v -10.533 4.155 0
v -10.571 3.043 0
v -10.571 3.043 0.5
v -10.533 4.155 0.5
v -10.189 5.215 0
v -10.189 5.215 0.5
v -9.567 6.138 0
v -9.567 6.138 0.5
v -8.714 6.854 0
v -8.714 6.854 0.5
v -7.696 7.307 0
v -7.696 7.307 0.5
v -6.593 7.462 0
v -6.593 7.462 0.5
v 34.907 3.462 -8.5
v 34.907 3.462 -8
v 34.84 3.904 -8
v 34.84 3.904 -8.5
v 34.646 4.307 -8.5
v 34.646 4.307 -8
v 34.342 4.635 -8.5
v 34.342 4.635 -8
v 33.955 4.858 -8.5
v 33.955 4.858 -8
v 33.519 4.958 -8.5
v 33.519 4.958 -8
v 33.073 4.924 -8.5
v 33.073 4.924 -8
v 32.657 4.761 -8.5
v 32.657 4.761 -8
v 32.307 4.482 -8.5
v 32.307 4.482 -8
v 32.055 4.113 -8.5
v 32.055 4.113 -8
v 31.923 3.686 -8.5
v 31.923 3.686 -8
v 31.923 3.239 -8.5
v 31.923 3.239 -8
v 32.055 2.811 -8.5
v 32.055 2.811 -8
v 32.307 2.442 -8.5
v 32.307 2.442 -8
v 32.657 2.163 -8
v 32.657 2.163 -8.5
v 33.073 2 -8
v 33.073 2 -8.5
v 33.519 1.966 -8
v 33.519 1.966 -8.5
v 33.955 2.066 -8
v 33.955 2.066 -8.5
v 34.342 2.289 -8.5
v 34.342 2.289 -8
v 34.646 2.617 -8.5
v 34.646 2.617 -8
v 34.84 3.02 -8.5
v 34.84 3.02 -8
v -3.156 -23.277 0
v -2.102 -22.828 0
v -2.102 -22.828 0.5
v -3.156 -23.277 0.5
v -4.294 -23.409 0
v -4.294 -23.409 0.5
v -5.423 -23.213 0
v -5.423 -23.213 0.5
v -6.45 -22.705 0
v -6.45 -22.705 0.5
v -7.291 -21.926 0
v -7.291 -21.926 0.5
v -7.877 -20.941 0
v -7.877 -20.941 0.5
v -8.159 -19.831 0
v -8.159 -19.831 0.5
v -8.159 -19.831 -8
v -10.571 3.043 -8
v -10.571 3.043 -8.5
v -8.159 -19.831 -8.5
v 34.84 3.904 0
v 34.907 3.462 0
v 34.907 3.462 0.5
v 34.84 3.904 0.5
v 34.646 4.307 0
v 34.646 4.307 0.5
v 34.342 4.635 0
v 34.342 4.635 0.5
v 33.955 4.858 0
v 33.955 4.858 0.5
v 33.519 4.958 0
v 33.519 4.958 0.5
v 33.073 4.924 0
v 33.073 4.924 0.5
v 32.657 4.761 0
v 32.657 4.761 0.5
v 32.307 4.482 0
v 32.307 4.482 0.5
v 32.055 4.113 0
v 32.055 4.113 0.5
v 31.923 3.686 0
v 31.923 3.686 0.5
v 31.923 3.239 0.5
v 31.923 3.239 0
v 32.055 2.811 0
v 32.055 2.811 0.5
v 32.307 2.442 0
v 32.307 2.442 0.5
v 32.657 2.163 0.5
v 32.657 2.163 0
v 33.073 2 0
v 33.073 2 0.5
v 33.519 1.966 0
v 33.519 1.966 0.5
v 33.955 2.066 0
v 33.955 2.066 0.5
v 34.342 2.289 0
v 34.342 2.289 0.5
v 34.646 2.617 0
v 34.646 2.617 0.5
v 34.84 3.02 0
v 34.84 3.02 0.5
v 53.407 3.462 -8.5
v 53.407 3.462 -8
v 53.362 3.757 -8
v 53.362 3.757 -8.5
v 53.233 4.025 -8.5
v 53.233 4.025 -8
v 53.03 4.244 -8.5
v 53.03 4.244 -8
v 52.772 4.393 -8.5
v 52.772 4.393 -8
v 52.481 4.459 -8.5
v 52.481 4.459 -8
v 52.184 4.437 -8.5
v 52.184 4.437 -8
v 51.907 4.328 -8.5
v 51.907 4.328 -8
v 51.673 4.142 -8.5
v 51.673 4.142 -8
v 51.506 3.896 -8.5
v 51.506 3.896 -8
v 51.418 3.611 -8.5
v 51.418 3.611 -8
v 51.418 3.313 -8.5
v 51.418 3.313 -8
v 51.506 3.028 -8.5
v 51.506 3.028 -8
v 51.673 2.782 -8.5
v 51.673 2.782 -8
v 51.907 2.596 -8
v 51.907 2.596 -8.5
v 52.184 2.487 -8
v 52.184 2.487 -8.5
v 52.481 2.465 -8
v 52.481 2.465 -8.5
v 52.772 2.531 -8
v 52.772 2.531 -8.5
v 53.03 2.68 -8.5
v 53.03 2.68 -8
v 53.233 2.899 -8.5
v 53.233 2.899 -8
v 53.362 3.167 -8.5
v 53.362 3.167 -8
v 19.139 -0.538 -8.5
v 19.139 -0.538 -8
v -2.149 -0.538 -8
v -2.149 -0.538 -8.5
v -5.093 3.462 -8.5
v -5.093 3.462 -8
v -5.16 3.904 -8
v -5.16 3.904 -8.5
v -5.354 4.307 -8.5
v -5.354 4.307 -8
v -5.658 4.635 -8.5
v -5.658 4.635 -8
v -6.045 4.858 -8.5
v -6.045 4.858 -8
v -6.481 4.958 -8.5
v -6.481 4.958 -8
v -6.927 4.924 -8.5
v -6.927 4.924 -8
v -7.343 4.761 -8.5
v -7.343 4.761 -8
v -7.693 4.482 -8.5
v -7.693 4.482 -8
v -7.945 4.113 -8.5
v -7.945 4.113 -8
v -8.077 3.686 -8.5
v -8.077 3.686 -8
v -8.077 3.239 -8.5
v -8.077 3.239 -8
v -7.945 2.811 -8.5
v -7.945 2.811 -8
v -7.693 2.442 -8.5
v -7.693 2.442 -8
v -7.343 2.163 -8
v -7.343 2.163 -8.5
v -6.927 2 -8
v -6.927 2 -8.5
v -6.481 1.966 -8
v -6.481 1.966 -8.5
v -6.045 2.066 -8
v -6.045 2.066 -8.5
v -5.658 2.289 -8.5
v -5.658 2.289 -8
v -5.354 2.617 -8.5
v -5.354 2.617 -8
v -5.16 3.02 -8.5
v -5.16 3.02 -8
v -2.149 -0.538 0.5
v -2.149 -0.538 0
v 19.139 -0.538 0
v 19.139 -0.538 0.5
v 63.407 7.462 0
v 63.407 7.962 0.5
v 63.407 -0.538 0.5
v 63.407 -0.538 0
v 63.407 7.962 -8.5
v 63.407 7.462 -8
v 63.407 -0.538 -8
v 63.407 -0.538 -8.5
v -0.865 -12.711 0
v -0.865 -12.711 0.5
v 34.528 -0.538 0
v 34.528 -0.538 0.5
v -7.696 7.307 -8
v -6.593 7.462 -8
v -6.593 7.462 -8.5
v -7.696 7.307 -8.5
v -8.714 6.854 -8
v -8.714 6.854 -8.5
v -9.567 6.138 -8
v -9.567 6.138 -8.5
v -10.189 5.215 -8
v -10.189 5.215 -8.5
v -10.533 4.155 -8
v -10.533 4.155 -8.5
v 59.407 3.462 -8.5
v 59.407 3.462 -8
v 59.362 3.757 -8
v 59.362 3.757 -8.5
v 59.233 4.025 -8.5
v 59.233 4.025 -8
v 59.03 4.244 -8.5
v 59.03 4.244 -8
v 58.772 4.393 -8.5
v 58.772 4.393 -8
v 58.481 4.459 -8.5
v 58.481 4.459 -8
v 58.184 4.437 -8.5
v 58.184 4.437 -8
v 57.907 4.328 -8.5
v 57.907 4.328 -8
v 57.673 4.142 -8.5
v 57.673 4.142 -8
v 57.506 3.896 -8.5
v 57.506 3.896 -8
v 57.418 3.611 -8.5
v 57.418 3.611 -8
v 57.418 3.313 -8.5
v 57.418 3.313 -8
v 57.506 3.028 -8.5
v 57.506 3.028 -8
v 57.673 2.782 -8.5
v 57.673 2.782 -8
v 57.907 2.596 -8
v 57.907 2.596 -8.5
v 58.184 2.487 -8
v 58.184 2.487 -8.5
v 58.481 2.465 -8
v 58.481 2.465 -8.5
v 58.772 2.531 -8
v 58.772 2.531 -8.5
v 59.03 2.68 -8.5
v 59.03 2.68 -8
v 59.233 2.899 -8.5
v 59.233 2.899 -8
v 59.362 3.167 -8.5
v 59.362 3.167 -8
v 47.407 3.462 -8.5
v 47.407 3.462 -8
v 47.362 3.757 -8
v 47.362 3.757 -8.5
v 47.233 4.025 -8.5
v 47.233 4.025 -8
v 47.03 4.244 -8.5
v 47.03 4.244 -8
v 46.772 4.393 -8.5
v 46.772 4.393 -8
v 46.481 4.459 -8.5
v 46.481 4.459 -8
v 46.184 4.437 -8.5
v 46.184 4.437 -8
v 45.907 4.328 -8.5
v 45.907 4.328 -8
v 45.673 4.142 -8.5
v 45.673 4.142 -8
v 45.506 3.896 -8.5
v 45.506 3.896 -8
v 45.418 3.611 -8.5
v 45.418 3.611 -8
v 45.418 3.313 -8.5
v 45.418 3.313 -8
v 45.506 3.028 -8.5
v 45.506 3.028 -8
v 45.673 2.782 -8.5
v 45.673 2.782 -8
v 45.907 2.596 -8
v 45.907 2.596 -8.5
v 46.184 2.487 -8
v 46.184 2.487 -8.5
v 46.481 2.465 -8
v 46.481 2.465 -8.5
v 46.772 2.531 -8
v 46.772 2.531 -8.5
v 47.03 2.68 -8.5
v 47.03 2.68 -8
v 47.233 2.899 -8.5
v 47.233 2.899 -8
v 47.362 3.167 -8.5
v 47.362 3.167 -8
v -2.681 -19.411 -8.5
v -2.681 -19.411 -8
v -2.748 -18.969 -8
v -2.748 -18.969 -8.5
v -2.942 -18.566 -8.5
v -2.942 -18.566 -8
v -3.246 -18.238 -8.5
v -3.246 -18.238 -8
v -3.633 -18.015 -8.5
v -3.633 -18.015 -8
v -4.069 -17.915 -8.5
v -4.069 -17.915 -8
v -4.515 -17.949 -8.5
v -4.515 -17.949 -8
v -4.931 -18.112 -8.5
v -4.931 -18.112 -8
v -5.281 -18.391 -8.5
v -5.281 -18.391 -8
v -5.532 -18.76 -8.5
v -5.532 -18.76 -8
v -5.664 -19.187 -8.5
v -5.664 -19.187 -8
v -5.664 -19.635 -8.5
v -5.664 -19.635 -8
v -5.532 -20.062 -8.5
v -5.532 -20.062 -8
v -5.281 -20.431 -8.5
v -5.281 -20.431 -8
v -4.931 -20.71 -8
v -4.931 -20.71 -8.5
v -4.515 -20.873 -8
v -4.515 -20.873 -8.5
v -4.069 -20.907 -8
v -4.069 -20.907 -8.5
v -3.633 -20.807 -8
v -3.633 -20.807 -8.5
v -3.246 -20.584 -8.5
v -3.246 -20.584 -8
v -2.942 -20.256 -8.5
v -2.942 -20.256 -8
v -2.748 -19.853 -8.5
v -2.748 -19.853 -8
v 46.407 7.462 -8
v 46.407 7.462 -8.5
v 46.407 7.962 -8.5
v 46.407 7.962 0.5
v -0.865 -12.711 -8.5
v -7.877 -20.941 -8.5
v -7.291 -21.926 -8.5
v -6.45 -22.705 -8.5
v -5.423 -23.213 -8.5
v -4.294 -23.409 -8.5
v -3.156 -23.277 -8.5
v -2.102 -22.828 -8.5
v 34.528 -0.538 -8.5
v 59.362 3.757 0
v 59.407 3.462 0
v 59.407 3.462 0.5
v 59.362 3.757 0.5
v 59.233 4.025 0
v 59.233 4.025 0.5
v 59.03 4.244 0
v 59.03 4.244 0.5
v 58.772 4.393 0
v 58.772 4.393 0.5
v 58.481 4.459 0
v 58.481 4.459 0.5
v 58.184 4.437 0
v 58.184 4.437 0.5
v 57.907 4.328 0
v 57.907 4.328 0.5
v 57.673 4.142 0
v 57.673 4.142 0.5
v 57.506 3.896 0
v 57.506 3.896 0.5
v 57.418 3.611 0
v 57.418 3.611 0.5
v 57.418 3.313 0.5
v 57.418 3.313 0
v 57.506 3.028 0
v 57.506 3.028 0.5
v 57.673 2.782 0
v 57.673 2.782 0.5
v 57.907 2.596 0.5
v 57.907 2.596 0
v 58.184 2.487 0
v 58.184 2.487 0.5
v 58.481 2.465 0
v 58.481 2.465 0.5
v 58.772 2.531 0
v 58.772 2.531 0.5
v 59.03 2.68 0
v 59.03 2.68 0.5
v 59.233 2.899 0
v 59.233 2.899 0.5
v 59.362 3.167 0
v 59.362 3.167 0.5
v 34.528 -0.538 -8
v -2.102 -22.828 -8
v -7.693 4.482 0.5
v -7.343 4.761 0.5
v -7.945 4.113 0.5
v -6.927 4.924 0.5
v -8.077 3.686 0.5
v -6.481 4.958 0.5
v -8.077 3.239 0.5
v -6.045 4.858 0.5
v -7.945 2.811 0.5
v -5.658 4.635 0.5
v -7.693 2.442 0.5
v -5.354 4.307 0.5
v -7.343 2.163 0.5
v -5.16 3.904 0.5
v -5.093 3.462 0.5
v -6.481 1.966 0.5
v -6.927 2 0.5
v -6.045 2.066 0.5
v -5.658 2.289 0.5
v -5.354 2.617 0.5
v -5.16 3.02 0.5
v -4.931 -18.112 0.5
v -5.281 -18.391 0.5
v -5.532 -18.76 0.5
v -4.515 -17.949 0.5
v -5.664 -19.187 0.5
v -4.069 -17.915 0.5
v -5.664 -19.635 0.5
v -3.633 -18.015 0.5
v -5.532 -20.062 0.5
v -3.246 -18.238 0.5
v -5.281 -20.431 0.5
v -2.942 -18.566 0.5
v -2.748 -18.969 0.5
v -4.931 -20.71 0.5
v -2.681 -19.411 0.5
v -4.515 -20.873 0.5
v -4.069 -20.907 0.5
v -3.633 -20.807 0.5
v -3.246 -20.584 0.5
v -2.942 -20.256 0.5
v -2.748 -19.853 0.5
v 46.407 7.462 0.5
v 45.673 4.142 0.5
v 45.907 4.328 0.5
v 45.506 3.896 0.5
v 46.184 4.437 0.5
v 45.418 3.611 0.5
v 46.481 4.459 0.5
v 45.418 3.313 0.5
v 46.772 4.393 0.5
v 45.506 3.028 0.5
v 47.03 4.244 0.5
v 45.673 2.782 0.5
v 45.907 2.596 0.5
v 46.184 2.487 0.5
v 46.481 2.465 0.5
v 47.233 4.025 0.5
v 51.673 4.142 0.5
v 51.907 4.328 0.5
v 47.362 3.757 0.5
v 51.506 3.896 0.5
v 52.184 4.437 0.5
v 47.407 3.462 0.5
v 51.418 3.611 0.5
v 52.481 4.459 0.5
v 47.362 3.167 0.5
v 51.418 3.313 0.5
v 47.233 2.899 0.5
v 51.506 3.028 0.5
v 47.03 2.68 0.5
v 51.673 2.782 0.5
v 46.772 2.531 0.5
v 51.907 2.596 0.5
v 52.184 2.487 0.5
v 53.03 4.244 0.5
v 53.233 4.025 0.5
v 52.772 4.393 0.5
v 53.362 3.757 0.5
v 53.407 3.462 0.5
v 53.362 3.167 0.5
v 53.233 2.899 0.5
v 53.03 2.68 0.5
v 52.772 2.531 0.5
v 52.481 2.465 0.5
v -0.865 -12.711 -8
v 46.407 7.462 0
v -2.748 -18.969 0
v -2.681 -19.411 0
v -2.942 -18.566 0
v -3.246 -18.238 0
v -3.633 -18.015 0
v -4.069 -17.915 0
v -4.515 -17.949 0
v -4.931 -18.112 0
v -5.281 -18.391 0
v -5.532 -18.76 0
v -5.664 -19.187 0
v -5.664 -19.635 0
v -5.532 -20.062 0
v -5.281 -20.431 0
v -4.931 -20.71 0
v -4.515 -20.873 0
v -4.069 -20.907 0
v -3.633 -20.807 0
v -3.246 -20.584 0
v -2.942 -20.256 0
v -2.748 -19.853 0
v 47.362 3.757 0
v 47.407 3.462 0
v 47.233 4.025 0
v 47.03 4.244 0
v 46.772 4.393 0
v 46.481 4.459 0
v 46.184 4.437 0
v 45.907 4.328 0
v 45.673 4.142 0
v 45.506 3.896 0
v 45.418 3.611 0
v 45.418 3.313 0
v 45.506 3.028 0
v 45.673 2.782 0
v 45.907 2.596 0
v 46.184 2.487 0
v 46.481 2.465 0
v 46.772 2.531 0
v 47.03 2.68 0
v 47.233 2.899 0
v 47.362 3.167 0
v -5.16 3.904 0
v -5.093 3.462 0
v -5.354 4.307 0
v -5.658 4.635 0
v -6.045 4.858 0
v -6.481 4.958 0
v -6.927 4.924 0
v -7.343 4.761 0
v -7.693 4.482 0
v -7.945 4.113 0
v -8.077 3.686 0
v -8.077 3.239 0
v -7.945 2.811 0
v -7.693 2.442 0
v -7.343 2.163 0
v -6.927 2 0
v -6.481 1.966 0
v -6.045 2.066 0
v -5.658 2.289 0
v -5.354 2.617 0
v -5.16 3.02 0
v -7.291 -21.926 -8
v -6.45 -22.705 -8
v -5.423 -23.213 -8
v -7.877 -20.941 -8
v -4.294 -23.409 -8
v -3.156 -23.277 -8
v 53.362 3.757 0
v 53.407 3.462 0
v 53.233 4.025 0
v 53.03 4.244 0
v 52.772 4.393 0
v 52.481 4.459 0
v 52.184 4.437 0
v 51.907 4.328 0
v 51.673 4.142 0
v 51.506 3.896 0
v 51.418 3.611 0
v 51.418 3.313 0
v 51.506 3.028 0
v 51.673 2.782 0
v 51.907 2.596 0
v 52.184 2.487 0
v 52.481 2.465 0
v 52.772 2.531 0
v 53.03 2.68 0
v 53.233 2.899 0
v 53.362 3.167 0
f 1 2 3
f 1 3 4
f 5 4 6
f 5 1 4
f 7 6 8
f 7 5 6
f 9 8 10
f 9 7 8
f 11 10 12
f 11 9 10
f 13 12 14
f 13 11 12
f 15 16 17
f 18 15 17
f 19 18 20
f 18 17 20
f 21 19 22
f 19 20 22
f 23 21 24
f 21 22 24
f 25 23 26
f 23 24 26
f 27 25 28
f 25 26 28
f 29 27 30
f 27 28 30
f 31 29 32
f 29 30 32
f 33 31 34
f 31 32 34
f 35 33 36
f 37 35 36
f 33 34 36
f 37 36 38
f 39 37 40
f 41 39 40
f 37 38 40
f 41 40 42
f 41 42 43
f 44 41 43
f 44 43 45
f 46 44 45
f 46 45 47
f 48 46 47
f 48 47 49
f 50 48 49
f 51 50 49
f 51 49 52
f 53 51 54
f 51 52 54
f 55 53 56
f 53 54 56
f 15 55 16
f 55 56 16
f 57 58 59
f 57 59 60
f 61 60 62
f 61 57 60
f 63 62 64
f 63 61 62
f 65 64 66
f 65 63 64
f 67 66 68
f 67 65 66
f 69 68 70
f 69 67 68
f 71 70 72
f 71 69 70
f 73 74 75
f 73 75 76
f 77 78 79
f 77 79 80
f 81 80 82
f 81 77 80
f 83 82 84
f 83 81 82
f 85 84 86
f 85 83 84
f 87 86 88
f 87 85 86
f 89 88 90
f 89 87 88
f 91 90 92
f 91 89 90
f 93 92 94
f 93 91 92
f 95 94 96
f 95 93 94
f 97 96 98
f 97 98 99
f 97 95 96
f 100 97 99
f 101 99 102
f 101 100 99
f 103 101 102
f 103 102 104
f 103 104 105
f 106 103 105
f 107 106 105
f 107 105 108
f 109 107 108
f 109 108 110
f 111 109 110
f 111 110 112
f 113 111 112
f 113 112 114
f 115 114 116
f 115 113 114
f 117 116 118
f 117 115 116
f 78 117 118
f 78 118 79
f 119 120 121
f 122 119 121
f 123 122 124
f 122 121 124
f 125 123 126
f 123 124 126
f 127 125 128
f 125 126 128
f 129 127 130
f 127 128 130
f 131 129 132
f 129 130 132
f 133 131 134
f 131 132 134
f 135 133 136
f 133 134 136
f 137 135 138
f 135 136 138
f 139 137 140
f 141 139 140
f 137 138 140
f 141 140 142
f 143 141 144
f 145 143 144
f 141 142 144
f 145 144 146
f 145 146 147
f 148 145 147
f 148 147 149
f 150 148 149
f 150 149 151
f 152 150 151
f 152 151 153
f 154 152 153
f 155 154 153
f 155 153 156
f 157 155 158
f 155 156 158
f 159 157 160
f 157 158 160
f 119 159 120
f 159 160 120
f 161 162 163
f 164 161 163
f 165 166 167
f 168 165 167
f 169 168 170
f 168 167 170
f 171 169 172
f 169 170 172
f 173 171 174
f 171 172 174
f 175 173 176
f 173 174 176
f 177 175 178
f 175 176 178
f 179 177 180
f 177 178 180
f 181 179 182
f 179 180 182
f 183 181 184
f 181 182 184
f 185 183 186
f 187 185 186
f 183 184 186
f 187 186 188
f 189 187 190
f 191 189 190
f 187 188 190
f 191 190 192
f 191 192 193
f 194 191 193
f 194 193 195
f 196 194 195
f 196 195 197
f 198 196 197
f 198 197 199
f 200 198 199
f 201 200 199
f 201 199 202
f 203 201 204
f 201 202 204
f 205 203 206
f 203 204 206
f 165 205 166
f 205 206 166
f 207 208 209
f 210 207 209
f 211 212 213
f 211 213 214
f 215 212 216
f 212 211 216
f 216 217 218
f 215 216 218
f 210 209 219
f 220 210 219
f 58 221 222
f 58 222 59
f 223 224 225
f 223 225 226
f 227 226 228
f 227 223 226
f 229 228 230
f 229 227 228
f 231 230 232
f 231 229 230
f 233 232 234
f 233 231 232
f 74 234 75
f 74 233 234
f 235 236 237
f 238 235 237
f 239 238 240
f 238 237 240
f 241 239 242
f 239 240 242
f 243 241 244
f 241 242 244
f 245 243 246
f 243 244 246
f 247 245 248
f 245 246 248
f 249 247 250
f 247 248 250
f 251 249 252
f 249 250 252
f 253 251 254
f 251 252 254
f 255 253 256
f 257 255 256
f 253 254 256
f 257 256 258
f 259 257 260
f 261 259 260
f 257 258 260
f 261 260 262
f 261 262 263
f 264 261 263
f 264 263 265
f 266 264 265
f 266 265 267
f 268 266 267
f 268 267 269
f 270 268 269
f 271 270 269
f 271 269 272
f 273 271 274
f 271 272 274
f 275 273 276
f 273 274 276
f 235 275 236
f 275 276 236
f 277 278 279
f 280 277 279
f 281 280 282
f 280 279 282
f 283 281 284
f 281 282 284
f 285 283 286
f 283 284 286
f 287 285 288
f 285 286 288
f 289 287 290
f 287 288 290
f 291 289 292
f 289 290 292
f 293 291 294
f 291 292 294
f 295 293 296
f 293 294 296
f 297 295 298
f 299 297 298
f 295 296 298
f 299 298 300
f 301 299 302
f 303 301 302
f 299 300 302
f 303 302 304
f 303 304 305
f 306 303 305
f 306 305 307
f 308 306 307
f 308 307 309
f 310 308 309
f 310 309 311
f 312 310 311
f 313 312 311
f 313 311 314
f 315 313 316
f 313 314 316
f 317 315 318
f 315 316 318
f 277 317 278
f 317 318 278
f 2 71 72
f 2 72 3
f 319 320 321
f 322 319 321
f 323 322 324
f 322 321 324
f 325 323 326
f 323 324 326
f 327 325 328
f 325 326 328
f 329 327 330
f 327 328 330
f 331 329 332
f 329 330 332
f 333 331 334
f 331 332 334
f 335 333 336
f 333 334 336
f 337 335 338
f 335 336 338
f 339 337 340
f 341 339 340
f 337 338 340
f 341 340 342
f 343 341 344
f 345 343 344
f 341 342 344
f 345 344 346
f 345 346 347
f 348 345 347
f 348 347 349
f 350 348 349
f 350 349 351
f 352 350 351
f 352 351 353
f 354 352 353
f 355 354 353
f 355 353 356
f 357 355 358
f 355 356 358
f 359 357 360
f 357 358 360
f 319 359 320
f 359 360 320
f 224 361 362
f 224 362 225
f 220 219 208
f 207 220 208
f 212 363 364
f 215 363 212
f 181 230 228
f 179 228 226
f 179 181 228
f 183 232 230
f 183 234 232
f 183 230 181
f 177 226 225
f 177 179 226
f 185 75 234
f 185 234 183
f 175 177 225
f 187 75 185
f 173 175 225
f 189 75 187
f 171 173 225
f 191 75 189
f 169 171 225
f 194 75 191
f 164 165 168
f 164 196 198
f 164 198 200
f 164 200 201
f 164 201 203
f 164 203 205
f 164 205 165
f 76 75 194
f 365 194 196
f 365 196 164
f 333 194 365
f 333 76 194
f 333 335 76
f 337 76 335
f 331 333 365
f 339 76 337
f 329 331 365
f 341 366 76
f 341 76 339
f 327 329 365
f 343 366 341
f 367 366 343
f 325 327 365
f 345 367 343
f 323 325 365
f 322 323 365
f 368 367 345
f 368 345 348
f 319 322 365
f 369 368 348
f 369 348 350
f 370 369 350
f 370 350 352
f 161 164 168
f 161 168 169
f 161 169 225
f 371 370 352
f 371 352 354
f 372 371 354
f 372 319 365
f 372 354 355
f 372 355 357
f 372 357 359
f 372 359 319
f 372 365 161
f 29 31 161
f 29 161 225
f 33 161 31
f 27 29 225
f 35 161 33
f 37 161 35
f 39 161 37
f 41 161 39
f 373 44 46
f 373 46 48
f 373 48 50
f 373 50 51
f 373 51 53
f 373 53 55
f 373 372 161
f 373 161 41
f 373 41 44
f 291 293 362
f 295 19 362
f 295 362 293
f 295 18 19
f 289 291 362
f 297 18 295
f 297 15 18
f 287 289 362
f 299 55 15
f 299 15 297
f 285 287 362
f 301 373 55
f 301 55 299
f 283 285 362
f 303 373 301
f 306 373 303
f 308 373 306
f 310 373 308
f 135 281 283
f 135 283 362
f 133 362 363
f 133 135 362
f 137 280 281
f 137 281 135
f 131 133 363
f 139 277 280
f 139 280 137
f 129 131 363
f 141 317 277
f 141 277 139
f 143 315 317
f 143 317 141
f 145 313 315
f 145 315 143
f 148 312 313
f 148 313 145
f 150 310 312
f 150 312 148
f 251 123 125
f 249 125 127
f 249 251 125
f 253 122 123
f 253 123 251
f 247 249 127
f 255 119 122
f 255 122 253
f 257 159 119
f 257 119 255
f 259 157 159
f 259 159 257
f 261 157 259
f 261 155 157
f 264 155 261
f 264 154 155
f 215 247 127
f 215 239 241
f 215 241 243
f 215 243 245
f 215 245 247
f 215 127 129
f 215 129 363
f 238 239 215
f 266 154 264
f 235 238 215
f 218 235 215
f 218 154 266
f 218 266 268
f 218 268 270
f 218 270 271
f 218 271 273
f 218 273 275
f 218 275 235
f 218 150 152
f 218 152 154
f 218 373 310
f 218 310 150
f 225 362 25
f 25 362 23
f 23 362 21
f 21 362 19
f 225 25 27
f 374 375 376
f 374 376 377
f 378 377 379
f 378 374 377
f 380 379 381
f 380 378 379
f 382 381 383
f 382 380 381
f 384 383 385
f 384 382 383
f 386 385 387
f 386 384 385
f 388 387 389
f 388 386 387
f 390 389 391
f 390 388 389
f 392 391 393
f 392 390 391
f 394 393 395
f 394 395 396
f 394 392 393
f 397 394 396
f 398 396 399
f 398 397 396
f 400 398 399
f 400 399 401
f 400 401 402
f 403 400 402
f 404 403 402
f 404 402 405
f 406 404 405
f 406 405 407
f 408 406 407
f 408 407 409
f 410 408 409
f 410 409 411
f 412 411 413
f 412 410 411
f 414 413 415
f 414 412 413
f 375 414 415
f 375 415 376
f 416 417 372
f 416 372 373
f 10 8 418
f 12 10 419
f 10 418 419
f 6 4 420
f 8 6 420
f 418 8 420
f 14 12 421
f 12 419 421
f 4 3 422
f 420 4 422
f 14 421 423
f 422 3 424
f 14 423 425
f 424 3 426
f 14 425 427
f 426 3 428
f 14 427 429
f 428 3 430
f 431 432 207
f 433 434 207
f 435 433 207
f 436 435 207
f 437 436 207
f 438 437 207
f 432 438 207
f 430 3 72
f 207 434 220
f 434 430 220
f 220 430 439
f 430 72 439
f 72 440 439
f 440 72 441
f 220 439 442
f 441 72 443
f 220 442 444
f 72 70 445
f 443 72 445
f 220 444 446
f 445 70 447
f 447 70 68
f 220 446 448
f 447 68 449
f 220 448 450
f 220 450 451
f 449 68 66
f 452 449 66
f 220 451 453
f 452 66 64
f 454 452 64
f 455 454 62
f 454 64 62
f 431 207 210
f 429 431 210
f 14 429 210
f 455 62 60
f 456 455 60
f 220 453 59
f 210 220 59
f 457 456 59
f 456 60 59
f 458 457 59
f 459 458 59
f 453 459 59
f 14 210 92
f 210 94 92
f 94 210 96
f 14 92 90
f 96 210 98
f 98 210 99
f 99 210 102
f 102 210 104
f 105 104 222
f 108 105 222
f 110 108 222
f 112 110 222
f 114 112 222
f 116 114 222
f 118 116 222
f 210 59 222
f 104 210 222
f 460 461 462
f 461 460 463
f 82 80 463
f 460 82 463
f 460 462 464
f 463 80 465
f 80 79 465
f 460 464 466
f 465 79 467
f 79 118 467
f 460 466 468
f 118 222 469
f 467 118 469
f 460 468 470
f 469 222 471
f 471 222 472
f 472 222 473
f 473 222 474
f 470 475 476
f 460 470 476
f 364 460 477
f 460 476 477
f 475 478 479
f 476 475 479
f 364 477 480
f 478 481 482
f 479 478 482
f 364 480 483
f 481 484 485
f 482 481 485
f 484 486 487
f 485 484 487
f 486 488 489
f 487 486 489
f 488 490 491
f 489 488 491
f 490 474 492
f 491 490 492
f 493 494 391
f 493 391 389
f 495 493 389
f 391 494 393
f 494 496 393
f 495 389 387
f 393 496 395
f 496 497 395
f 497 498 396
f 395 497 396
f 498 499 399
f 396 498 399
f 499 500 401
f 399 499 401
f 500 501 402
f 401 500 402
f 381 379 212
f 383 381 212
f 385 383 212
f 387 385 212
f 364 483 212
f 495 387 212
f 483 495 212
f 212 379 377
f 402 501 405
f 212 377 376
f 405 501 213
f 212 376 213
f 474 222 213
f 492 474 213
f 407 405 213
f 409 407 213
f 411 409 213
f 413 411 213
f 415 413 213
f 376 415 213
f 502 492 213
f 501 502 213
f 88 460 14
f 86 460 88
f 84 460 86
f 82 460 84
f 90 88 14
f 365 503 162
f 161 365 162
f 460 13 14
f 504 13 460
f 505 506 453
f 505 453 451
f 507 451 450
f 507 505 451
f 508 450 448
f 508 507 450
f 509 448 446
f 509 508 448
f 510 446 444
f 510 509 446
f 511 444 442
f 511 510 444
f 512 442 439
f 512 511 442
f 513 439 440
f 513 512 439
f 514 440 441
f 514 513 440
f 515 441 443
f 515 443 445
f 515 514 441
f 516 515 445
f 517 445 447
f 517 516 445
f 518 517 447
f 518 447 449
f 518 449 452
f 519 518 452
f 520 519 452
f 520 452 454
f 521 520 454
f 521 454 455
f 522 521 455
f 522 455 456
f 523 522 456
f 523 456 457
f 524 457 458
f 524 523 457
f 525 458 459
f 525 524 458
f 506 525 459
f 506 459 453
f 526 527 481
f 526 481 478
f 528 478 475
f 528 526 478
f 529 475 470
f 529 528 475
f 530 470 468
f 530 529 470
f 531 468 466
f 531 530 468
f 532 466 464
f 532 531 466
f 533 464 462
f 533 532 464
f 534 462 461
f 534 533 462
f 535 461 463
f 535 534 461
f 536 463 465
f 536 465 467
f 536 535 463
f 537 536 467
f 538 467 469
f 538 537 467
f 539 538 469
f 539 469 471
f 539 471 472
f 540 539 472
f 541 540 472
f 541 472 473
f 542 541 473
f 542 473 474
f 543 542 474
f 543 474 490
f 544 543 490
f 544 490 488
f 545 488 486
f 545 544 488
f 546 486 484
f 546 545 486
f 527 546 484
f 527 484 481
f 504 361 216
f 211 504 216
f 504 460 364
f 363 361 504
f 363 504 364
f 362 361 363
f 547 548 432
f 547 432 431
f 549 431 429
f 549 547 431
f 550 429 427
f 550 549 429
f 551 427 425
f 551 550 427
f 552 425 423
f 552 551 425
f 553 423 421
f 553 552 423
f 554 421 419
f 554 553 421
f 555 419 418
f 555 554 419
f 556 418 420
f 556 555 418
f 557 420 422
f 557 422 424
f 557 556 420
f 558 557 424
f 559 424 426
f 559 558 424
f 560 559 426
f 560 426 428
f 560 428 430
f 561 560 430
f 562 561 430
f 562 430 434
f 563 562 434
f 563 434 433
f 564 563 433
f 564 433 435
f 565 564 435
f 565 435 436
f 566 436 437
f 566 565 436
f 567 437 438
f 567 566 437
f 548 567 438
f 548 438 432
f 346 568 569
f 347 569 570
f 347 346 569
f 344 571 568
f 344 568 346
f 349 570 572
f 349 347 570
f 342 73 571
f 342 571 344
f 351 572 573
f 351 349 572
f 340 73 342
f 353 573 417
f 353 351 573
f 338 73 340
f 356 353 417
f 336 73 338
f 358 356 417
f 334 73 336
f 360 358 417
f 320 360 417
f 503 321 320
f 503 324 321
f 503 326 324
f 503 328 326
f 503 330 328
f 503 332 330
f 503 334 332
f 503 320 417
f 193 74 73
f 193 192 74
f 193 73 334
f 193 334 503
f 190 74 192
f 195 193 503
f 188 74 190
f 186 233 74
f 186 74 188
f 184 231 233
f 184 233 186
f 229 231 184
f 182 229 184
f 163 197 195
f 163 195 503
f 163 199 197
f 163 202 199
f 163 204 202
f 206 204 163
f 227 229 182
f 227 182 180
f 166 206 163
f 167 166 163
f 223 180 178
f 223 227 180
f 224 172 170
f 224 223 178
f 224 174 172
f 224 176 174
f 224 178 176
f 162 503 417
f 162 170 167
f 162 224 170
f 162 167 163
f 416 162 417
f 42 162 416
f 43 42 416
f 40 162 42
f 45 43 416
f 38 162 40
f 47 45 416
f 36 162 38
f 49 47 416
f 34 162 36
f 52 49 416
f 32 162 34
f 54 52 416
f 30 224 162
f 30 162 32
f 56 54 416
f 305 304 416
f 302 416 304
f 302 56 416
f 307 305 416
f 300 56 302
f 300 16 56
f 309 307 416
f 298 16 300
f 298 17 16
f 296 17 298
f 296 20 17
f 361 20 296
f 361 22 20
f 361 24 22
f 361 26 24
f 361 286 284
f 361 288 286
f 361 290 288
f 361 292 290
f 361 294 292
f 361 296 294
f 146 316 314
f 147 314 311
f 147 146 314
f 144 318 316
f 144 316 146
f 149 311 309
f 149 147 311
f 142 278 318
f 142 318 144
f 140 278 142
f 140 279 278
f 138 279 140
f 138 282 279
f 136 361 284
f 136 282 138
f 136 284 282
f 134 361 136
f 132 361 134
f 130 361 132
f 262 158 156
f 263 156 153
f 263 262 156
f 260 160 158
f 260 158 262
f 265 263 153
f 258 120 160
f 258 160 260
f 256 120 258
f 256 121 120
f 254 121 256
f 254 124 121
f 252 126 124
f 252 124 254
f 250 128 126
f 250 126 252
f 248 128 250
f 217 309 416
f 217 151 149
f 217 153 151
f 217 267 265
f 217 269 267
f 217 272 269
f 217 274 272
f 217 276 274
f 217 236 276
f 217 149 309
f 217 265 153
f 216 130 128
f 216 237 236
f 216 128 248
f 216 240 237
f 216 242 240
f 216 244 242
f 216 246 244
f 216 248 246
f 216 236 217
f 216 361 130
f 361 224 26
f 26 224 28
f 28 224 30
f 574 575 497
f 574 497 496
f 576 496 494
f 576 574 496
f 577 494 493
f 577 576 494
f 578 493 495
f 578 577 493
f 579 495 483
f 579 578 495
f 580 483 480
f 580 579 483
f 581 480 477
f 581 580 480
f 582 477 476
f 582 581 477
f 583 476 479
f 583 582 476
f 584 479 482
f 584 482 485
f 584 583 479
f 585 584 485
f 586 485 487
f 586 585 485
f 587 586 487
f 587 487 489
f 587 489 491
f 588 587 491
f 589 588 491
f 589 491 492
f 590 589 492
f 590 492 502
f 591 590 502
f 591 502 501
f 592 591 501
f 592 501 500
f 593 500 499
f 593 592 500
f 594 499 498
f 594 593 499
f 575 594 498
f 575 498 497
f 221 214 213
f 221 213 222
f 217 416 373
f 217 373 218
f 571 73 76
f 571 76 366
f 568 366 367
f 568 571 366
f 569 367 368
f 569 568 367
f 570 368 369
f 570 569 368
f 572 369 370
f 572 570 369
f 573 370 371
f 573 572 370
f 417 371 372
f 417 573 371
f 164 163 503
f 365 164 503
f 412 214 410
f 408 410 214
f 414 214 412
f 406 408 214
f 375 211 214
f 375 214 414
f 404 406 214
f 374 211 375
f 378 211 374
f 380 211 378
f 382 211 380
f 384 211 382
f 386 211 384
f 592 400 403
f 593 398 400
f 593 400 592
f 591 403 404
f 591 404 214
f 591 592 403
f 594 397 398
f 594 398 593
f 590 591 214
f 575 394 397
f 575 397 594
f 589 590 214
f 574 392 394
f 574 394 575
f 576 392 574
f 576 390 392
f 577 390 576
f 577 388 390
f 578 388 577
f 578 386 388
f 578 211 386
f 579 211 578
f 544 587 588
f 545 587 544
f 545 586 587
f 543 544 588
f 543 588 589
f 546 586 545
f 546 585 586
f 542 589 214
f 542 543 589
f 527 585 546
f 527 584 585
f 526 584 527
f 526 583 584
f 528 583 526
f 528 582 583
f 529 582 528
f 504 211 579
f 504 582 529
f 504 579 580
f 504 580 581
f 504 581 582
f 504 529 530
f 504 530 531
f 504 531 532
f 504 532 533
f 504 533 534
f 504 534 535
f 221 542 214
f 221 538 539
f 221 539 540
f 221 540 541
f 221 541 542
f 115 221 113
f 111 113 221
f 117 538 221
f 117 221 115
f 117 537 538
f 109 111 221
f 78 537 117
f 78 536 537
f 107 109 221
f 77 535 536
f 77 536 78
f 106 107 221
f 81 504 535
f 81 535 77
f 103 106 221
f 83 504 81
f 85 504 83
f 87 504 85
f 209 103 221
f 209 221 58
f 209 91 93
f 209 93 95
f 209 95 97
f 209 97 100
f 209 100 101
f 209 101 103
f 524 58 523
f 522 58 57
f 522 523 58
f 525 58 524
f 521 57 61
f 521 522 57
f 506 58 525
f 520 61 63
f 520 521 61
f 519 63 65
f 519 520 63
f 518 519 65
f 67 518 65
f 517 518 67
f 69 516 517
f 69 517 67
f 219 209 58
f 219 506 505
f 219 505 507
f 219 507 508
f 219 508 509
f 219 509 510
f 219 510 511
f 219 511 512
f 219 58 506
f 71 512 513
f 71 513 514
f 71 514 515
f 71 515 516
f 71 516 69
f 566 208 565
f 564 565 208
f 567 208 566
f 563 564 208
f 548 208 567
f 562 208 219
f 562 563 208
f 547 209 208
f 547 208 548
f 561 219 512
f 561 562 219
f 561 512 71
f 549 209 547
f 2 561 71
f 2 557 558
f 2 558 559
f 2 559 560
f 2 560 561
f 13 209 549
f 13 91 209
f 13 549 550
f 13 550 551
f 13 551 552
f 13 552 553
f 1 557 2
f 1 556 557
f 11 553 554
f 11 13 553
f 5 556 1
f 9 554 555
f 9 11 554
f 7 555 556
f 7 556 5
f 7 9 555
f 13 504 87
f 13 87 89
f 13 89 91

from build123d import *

# Parameters (mm, degrees)
SKETCH_1_R      = 1.5
SKETCH_1_R_2    = 1
EXTRUDE_1_DEPTH = 0.5
SKETCH_2_R      = 1.5
SKETCH_2_R_2    = 1
EXTRUDE_2_DEPTH = 0.5
SKETCH_3_W      = 17
SKETCH_3_H      = 9
EXTRUDE_3_DEPTH = 0.5


with BuildPart() as part:
    # 草图1 → 凸台-拉伸1 (new body)
    with BuildSketch(Plane.XY):
        with BuildLine():
            Line((-6.593488685, 7.462066188), (63.406511315, 7.462066188))
            Line((63.406511315, 7.462066188), (63.406511315, -0.537933812))
            Line((63.406511315, -0.537933812), (34.527914712, -0.537933812))
            Line((34.527914712, -0.537933812), (-2.101613692, -22.82810419))
            ThreePointArc((-2.101613692, -22.82810419), (-5.955067108, -22.996117417), (-8.158923454, -19.830623953))
            Line((-8.158923454, -19.830623953), (-10.571423454, 3.04250097))
            ThreePointArc((-10.571423454, 3.04250097), (-9.566556198, 6.138046301), (-6.593488685, 7.462066188))
        make_face()
        with Locations((-6.593488685, 3.462066188)):
            Circle(SKETCH_1_R, mode=Mode.SUBTRACT)
        with Locations((33.406511315, 3.462066188)):
            Circle(SKETCH_1_R, mode=Mode.SUBTRACT)
        with Locations((-4.180988685, -19.411058735)):
            Circle(SKETCH_1_R, mode=Mode.SUBTRACT)
        with Locations((58.406511315, 3.462066188)):
            Circle(SKETCH_1_R_2, mode=Mode.SUBTRACT)
        with Locations((52.406511315, 3.462066188)):
            Circle(SKETCH_1_R_2, mode=Mode.SUBTRACT)
        with Locations((46.406511315, 3.462066188)):
            Circle(SKETCH_1_R_2, mode=Mode.SUBTRACT)
        Polygon((-2.149408554, -0.537933812), (19.138675105, -0.537933812), (-0.865471009, -12.711058735), align=None, mode=Mode.SUBTRACT)
    extrude(amount=EXTRUDE_1_DEPTH)



with BuildPart() as body_2:
    # 草图2 → 凸台-拉伸2 (new body)
    with BuildSketch(Plane.XY.offset(-8)):
        with BuildLine():
            Line((-2.101613692, -22.82810419), (34.527914712, -0.537933812))
            Line((34.527914712, -0.537933812), (63.406511315, -0.537933812))
            Line((63.406511315, -0.537933812), (63.406511315, 7.462066188))
            Line((63.406511315, 7.462066188), (-6.593488685, 7.462066188))
            ThreePointArc((-6.593488685, 7.462066188), (-9.566556198, 6.138046301), (-10.571423454, 3.04250097))
            Line((-10.571423454, 3.04250097), (-8.158923454, -19.830623953))
            ThreePointArc((-8.158923454, -19.830623953), (-5.955067108, -22.996117417), (-2.101613692, -22.82810419))
        make_face()
        with Locations((-4.180988685, -19.411058735)):
            Circle(SKETCH_2_R, mode=Mode.SUBTRACT)
        with Locations((33.406511315, 3.462066188)):
            Circle(SKETCH_2_R, mode=Mode.SUBTRACT)
        with Locations((-6.593488685, 3.462066188)):
            Circle(SKETCH_2_R, mode=Mode.SUBTRACT)
        with Locations((52.406511315, 3.462066188)):
            Circle(SKETCH_2_R_2, mode=Mode.SUBTRACT)
        with Locations((58.406511315, 3.462066188)):
            Circle(SKETCH_2_R_2, mode=Mode.SUBTRACT)
        with Locations((46.406511315, 3.462066188)):
            Circle(SKETCH_2_R_2, mode=Mode.SUBTRACT)
        Polygon((-0.865471009, -12.711058735), (19.138675105, -0.537933812), (-2.149408554, -0.537933812), align=None, mode=Mode.SUBTRACT)
    extrude(amount=-EXTRUDE_2_DEPTH)


with BuildPart() as part_1:
    add(part.part)

    add(body_2.part)  # 凸台-拉伸3 merges body 2
    # 草图3 → 凸台-拉伸3 (add)
    with BuildSketch(Plane(origin=(0, 7.462066188, 0), x_dir=(1, 0, 0), z_dir=(0, 1, 0))):
        with Locations((54.906511315, 4)):
            Rectangle(SKETCH_3_W, SKETCH_3_H)
    extrude(amount=EXTRUDE_3_DEPTH)


solid = part_1.part
